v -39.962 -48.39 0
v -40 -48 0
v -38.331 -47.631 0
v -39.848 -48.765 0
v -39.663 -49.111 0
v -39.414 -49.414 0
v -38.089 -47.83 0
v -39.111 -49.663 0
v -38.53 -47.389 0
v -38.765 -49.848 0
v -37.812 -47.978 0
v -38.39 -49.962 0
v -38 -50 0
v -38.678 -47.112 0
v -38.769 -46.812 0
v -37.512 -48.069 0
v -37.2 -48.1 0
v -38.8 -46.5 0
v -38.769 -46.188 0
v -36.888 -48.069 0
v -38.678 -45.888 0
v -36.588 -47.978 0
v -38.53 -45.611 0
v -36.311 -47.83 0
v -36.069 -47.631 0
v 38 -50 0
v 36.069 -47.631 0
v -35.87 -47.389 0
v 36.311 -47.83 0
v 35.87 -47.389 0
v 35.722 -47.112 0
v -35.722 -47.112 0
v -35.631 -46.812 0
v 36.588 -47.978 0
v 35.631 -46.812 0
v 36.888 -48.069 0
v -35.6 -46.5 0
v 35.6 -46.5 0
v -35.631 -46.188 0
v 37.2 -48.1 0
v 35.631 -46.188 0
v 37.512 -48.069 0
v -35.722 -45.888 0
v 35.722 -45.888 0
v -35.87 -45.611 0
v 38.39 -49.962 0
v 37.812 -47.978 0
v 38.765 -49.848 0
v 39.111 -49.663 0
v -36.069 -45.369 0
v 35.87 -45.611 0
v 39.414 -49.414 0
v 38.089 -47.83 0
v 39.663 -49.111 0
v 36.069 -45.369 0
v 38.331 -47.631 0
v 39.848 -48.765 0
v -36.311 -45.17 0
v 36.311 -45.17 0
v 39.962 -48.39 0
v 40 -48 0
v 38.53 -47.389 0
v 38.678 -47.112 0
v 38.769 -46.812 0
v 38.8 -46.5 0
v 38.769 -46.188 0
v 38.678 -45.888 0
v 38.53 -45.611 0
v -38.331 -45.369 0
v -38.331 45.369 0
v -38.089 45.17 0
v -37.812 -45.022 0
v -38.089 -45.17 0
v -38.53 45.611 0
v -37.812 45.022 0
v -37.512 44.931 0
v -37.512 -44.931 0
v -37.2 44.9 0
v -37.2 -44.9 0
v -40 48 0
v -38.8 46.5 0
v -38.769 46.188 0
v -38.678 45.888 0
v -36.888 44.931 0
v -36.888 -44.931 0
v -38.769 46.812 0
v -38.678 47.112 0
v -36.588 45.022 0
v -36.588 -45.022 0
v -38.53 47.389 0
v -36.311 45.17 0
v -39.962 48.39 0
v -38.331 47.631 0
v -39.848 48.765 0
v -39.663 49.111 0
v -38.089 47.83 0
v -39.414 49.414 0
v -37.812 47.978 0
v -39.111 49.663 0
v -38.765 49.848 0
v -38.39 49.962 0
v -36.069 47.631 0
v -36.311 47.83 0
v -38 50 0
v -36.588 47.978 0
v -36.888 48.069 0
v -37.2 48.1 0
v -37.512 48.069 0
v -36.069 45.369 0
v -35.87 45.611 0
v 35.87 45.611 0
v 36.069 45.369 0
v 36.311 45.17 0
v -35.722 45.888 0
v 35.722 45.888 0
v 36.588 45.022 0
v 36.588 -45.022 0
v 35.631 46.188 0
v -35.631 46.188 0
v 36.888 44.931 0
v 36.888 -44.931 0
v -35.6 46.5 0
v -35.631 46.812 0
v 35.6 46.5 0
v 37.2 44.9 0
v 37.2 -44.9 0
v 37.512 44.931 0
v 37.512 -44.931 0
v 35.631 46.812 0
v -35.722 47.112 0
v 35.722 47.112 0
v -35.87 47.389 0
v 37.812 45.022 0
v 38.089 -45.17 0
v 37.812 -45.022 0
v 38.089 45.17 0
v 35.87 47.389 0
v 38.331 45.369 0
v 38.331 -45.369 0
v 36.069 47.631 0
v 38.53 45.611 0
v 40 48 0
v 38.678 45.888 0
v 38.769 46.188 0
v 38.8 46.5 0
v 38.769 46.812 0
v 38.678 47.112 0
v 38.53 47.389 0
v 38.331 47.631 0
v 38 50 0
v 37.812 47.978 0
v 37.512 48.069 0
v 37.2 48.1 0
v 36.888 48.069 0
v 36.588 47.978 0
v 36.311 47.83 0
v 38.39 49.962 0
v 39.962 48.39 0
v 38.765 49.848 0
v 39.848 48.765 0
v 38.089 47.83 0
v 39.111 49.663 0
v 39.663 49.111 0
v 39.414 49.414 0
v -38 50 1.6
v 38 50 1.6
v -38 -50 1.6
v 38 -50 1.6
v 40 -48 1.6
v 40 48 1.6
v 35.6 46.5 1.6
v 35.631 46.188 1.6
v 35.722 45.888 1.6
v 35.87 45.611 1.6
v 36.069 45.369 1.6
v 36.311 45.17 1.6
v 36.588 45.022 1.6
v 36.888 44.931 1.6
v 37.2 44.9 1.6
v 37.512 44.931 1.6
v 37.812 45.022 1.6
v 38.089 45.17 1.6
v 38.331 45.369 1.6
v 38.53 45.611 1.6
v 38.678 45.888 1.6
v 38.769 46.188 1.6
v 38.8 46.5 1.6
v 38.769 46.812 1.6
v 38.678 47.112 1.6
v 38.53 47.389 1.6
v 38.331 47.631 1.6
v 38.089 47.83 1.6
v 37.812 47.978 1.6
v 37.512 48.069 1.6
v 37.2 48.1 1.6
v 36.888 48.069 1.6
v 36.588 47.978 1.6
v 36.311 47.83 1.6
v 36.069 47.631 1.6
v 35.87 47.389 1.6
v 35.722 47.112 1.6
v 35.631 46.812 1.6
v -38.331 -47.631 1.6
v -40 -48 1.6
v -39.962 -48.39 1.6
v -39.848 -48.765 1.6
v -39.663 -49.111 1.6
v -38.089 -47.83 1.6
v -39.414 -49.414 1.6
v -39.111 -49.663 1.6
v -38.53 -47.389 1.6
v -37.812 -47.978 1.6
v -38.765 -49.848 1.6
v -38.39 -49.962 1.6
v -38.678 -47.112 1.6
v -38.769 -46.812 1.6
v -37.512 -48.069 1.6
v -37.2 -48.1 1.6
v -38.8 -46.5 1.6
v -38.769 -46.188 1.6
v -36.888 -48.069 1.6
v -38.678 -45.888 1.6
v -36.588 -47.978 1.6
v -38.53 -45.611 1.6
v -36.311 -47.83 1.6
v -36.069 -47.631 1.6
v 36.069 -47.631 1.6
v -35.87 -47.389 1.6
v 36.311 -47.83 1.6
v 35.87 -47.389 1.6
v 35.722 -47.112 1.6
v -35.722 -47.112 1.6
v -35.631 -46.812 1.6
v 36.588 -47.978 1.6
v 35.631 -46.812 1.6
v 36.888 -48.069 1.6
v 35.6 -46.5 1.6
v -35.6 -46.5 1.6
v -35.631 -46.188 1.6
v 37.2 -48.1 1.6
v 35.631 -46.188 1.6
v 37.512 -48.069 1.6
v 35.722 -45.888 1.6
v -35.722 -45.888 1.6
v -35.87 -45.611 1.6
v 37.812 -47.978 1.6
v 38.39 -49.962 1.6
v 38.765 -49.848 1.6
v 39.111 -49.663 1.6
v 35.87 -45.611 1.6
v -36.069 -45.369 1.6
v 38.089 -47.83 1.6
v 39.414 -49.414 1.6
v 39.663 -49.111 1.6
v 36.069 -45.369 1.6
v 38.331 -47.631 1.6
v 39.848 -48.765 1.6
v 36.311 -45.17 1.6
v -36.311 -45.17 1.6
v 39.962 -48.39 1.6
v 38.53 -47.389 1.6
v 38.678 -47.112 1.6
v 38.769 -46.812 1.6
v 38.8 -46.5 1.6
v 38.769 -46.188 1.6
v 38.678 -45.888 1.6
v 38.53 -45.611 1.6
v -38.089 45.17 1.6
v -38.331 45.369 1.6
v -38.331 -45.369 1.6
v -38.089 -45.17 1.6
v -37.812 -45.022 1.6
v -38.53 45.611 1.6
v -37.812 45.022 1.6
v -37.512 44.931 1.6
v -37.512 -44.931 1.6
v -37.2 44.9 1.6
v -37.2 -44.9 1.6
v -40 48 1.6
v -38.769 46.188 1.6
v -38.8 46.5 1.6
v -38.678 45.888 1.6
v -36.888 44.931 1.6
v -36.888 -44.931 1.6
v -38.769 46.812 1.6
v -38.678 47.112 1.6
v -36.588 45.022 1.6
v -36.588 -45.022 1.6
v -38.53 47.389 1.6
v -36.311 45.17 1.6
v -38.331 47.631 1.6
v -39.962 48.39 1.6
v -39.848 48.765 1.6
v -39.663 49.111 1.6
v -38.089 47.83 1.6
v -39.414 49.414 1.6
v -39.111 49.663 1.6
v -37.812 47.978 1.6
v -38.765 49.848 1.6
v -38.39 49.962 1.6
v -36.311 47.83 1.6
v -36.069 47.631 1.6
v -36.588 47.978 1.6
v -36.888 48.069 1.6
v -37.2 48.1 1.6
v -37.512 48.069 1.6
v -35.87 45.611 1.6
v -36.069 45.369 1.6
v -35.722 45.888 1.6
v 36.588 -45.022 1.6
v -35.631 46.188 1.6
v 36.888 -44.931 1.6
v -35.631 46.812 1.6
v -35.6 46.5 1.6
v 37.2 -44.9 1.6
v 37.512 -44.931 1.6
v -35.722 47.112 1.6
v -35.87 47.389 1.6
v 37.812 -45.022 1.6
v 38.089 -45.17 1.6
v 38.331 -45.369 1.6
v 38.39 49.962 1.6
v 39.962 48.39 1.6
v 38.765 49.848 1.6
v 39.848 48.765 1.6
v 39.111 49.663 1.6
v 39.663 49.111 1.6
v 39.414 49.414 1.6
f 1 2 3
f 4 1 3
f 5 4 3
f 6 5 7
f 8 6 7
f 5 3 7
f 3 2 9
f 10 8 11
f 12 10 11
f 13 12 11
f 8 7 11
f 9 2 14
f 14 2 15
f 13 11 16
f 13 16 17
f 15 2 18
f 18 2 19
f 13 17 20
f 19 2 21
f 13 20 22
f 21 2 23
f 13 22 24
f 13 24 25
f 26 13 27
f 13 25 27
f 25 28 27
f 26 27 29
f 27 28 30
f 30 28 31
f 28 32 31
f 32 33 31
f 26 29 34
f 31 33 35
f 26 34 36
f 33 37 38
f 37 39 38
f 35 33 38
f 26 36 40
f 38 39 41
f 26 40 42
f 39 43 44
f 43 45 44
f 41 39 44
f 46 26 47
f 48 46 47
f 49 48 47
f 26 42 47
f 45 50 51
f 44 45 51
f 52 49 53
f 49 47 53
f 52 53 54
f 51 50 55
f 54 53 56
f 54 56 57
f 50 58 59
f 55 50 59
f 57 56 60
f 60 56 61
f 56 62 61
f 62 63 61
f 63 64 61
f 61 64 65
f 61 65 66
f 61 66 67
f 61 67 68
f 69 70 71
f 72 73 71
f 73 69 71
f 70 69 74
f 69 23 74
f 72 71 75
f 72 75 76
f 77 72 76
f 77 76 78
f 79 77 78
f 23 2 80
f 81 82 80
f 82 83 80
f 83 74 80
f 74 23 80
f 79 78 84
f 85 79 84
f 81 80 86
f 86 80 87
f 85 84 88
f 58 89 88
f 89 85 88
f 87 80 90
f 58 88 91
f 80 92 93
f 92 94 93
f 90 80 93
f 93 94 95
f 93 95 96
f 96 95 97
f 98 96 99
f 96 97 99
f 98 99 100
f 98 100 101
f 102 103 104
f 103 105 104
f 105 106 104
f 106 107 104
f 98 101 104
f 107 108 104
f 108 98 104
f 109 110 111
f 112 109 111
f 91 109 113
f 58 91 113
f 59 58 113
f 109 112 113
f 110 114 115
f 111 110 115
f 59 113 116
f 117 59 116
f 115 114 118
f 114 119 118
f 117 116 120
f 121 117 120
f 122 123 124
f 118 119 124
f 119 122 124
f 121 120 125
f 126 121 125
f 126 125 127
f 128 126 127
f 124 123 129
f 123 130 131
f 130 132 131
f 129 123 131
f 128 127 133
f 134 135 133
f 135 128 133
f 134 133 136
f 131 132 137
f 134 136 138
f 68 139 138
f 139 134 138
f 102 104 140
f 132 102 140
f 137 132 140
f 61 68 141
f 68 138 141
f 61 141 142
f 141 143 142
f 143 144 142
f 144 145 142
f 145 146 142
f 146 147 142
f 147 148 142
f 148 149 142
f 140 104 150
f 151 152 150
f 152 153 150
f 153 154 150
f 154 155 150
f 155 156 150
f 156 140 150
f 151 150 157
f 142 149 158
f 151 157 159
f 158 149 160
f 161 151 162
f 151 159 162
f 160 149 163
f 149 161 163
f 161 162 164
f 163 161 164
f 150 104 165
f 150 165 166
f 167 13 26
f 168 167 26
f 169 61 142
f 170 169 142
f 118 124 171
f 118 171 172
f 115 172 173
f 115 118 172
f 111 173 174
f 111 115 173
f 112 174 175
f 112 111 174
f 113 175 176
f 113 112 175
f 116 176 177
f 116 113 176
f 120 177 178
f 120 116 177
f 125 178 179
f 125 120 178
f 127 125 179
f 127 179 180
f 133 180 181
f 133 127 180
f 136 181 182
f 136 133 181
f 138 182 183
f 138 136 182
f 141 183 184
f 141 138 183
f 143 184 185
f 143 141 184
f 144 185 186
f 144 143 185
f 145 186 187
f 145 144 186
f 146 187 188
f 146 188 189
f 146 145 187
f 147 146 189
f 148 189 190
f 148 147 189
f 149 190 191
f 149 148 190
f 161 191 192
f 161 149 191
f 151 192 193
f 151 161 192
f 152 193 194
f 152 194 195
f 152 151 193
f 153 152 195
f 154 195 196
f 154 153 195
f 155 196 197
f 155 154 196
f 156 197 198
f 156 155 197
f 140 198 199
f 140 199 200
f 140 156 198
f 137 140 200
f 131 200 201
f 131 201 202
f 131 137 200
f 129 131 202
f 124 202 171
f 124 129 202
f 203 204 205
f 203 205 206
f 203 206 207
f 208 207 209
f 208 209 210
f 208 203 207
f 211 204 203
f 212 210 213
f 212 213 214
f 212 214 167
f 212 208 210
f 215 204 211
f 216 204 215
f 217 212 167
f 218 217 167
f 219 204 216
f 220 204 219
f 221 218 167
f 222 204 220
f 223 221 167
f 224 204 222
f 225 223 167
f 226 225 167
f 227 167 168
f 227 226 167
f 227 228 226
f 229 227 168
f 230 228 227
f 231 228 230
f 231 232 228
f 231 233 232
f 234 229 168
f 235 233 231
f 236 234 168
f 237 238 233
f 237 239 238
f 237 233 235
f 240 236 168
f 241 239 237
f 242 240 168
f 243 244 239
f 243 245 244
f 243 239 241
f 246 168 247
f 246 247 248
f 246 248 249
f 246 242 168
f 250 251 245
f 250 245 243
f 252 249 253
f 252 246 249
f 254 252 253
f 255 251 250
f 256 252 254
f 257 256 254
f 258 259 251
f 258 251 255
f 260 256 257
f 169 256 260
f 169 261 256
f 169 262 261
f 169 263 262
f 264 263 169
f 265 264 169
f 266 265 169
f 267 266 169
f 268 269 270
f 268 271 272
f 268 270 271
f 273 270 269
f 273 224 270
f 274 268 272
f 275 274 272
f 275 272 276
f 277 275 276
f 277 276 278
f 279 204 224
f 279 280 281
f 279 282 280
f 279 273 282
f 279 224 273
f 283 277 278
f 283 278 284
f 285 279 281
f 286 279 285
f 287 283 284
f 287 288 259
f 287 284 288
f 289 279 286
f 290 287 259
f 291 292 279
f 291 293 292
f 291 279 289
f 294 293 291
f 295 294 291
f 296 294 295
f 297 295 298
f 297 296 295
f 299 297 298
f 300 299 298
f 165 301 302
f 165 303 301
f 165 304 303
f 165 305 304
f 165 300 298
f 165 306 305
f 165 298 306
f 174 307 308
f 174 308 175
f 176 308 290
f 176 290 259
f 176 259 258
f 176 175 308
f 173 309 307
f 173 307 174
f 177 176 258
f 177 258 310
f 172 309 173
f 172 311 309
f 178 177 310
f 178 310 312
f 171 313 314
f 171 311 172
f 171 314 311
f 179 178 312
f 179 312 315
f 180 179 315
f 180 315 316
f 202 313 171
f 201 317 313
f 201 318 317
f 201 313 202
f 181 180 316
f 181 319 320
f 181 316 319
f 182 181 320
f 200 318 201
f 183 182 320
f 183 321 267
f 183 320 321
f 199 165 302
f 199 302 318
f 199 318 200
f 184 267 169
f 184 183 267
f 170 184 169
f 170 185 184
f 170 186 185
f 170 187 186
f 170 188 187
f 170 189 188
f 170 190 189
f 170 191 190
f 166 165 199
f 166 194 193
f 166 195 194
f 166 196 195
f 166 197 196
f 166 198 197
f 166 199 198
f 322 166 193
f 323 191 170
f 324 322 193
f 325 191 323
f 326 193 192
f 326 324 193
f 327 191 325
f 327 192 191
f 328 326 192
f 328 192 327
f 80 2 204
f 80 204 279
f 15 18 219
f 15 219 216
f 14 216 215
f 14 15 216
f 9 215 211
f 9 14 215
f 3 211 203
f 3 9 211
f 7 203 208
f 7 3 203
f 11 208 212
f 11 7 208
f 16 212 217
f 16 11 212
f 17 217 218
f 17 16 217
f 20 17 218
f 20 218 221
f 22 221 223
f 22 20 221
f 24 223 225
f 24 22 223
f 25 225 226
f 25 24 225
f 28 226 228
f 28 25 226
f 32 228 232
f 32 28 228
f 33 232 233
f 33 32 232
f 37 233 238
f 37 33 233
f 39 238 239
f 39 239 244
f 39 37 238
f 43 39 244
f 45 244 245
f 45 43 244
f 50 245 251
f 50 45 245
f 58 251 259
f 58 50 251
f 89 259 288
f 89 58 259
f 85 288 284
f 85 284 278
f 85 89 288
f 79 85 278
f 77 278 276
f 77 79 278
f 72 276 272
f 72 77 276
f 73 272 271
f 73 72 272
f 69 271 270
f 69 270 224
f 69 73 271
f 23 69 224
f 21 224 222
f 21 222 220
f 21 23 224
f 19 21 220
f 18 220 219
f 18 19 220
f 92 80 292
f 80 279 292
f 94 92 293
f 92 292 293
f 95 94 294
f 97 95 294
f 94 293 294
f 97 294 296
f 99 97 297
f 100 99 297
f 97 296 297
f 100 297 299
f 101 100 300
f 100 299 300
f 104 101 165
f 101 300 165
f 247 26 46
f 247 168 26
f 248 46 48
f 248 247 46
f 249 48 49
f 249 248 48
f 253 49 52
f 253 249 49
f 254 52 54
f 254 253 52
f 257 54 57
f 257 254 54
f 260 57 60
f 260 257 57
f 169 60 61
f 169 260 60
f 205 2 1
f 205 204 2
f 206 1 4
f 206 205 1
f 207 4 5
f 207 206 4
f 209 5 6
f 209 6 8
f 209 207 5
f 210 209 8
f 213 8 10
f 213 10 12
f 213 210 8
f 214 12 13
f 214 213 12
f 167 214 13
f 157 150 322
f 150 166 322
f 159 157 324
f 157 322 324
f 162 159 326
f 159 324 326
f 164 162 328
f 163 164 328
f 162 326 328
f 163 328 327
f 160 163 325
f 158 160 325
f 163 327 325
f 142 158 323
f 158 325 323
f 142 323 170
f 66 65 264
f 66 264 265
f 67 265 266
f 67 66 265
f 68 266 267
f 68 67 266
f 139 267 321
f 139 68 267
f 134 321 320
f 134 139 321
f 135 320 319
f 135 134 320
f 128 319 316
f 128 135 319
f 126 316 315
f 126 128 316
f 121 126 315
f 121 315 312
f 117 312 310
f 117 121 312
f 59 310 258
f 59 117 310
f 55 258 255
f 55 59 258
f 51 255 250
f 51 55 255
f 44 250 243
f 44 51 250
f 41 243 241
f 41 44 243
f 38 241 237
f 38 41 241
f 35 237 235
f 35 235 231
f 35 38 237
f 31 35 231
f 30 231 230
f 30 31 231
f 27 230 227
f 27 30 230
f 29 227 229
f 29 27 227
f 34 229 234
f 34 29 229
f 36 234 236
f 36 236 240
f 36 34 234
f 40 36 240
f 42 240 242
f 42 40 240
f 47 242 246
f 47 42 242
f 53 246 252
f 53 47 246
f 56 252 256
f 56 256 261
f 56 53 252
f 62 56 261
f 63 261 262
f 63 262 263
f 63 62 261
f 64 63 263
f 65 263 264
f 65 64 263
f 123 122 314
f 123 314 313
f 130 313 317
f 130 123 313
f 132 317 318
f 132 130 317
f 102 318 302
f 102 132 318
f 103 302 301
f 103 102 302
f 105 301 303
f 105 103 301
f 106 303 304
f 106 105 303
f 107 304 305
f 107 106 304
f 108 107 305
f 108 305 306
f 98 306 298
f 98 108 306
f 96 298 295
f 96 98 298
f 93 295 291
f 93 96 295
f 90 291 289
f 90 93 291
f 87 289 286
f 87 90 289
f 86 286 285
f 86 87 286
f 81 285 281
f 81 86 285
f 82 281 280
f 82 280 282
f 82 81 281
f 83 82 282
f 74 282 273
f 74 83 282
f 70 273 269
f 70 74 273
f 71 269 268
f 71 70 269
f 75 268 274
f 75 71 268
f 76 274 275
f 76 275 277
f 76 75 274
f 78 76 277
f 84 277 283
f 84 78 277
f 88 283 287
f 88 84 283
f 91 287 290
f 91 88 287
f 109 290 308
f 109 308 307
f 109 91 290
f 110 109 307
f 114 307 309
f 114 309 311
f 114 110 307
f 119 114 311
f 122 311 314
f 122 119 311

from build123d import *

# Parameters (mm, degrees)
SKETCH_1_W      = 80
SKETCH_1_H      = 100
SKETCH_1_R      = 1.6
EXTRUDE_1_DEPTH = 1.6
FILLET_1_R      = 2


with BuildPart() as part:
    # 草图1 → 凸台-拉伸1 (new body)
    with BuildSketch(Plane.XY):
        Rectangle(SKETCH_1_W, SKETCH_1_H)
        with Locations((-37.2, 46.5)):
            Circle(SKETCH_1_R, mode=Mode.SUBTRACT)
        with Locations(Location((37.2, 46.5, 0), (0, 0, 180))):
            Circle(SKETCH_1_R, mode=Mode.SUBTRACT)
        with Locations((37.2, -46.5)):
            Circle(SKETCH_1_R, mode=Mode.SUBTRACT)
        with Locations(Location((-37.2, -46.5, 0), (0, 0, 180))):
            Circle(SKETCH_1_R, mode=Mode.SUBTRACT)
    extrude(amount=EXTRUDE_1_DEPTH)

    # 圆角1
    fillet_1_edges = [part.edges().sort_by_distance(p)[0] for p in [
        (40, -50, 0.8),
        (-40, -50, 0.8),
        (-40, 50, 0.8),
        (40, 50, 0.8),
    ]]
    fillet(fillet_1_edges, radius=FILLET_1_R)


solid = part.part
